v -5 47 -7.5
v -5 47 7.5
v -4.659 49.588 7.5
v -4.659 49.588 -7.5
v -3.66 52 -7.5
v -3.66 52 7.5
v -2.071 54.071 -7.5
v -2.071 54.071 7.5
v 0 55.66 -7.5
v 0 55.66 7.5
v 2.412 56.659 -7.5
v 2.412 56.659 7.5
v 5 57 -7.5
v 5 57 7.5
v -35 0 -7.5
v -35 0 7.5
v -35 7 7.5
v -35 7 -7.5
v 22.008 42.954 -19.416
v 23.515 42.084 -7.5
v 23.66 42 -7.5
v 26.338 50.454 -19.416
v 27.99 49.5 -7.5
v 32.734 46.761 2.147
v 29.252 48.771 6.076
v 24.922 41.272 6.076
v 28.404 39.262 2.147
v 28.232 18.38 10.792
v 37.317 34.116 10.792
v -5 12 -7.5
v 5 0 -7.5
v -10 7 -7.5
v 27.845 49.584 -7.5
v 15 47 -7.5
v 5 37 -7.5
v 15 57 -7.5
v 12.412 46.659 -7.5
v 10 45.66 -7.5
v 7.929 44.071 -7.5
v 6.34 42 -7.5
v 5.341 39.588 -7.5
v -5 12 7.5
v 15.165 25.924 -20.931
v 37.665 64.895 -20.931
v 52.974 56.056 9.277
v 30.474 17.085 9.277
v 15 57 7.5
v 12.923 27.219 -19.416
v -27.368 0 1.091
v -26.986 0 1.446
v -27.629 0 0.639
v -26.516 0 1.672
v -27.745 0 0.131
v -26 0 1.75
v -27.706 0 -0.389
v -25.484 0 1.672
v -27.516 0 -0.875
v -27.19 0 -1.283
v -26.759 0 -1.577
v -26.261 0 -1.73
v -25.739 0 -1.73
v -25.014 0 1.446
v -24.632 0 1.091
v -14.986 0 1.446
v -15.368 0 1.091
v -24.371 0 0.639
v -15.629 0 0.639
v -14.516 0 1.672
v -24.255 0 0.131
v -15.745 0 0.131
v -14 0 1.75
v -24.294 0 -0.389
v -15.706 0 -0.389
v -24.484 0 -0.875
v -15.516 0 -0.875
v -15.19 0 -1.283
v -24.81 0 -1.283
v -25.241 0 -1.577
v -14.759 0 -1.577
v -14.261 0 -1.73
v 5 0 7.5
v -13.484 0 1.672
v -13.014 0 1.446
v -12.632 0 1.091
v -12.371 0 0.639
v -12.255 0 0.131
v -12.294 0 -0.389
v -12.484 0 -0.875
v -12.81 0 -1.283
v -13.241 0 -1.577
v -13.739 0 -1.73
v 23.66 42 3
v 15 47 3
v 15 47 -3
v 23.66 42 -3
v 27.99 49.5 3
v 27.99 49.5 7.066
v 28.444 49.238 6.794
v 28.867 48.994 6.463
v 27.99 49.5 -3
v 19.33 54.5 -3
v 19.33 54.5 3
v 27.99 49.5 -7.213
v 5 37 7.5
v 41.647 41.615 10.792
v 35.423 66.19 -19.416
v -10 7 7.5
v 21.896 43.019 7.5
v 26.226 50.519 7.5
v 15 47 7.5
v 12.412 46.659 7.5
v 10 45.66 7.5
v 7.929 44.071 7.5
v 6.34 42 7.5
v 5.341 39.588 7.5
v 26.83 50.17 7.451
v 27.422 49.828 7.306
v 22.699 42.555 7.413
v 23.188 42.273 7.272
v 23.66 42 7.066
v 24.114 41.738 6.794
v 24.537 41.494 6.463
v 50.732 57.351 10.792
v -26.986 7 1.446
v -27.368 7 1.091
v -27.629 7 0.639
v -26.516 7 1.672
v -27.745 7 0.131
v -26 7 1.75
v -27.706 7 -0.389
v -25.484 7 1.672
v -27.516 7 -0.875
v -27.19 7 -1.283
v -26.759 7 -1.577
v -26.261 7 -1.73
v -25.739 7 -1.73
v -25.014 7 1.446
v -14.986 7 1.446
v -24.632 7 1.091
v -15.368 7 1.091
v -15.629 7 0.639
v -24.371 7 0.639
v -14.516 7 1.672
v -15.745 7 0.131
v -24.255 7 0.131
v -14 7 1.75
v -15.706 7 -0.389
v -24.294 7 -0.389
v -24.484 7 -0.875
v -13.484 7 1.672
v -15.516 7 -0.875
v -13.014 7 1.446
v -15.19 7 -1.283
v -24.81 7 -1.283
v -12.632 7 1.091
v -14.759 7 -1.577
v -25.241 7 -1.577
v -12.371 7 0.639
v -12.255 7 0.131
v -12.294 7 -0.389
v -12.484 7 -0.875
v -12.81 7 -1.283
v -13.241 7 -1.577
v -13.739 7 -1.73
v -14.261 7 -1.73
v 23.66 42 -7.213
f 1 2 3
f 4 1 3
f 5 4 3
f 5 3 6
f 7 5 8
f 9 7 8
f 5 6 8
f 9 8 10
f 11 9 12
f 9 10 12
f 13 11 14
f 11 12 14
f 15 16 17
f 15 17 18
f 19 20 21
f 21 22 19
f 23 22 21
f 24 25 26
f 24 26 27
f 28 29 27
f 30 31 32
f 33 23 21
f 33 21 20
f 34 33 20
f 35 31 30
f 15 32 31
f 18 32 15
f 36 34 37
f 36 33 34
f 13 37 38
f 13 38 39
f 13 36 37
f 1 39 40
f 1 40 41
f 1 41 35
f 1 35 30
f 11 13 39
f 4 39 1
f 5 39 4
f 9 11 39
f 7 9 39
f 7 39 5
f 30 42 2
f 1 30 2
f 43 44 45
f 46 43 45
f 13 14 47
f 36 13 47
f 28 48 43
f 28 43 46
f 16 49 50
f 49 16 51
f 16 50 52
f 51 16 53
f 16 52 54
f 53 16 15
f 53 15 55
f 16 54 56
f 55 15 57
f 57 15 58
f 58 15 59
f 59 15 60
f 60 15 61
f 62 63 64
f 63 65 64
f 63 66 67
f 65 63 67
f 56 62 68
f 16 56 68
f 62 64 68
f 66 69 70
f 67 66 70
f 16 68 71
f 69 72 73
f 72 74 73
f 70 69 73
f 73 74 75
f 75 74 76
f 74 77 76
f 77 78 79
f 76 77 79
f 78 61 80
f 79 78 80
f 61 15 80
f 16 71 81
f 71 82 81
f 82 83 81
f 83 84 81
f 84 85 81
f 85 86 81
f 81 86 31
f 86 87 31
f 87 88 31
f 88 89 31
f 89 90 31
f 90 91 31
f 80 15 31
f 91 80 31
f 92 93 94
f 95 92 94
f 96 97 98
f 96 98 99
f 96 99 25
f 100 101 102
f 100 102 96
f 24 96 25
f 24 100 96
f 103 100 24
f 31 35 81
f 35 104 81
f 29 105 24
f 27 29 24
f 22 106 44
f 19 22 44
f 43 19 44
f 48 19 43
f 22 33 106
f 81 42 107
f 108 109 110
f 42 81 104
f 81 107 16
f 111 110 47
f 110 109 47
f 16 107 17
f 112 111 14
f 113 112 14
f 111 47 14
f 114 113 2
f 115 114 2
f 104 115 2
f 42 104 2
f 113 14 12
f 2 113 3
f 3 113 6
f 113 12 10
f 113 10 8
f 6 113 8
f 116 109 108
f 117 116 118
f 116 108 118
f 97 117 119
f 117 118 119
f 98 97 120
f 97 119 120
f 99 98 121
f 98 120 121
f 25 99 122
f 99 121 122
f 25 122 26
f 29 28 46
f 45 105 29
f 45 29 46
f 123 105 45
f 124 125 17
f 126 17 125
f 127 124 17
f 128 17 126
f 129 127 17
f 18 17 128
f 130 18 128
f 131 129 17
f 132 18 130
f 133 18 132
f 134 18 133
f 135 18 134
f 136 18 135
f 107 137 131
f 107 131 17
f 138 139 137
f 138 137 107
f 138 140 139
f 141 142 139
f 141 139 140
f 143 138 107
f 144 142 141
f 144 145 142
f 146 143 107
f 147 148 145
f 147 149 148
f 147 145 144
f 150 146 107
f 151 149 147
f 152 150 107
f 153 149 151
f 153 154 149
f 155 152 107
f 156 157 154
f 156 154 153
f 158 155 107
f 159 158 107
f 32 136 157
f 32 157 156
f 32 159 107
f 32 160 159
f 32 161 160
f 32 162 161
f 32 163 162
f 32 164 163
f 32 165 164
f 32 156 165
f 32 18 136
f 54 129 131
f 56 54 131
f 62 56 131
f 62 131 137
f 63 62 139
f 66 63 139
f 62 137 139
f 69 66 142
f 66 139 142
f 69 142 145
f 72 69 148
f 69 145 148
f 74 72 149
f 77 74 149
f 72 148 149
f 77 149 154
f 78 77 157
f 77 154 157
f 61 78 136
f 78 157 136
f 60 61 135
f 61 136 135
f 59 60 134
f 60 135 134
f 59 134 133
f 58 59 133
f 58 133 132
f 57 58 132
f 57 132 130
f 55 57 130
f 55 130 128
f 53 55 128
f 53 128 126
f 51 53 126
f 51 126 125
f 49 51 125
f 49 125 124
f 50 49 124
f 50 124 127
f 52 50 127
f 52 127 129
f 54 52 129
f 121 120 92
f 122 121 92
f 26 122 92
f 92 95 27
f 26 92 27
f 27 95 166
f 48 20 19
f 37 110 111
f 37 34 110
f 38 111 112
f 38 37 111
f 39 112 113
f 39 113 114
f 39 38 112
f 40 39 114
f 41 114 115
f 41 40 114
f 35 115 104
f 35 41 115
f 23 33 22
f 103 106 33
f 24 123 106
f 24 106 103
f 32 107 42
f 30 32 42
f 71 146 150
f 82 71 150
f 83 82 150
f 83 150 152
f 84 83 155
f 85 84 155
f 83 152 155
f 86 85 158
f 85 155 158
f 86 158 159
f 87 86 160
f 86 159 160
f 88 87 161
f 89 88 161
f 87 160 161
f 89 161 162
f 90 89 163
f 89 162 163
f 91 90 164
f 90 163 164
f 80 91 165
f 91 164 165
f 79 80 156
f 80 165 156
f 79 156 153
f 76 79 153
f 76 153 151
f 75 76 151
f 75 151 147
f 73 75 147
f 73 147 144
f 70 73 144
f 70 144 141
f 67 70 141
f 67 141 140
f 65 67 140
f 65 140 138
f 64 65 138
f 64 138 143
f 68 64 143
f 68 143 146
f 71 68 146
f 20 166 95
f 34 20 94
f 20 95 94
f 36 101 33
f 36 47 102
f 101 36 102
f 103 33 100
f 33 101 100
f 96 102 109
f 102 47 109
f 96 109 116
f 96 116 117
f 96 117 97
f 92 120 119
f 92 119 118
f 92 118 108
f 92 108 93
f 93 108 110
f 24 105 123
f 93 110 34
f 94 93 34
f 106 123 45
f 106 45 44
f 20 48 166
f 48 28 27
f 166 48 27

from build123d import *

# Parameters (mm, degrees)
SKETCH_1_W               = 40
SKETCH_1_H               = 15
EXTRUDE_1_DEPTH          = 7
SKETCH_3_W               = 10
SKETCH_3_H               = 6
EXTRUDE_2_DEPTH          = 50
EXTRUDE_5_DEPTH          = 6
FILLET_1_R               = 10
SKETCH_7_R               = 1.75
CUT_EXTRUDE_3_DEPTH      = 10
SKETCH_16_W              = 6
SKETCH_16_H              = 8.660254038
EXTRUDE_11_DEPTH         = 10
EXTRUDE_12_DEPTH         = 8.66
EXTRUDE_14_DEPTH         = 3
EXTRUDE_15_DEPTH         = 4.5
EXTRUDE_15_DEPTH_BACK    = 10.5
EXTRUDE_17_DEPTH         = 8.66
EXTRUDE_22_DEPTH         = 8.66
EXTRUDE_23_DEPTH         = 15
FILLET_2_R               = 10
EXTRUDE_24_DEPTH         = 35
CUT_EXTRUDE_4_DEPTH      = 35
CUT_EXTRUDE_4_DEPTH_BACK = 35
CUT_EXTRUDE_5_DEPTH      = 35
CUT_EXTRUDE_5_DEPTH_BACK = 35
FILLET_3_R               = 5


with BuildPart() as part:
    # 草图1 → 凸台-拉伸1 (new body)
    with BuildSketch(Plane(origin=(0, 0, 0), x_dir=(1, 0, 0), z_dir=(0, 1, 0))):
        with Locations((-15, 0)):
            Rectangle(SKETCH_1_W, SKETCH_1_H)
    extrude(amount=EXTRUDE_1_DEPTH)

    # 草图3 → 凸台-拉伸2 (add)
    with BuildSketch(Plane(origin=(0, 7, 0), x_dir=(1, 0, 0), z_dir=(0, 1, 0))):
        Rectangle(SKETCH_3_W, SKETCH_3_H)
    extrude(amount=EXTRUDE_2_DEPTH)

    # 草图4 → 凸台-拉伸5 (add)
    with BuildSketch(Plane.XY.offset(3)):
        Polygon((5, 57), (5, 47), (15, 47), (19.330127019, 54.5), (15, 57), align=None)
    extrude(amount=-EXTRUDE_5_DEPTH)

    # 圆角1
    fillet_1_edges = [part.edges().sort_by_distance(p)[0] for p in [
        (-5, 57, 0),
    ]]
    fillet(fillet_1_edges, radius=FILLET_1_R)

    # 草图7 → 切除-拉伸3 (cut)
    with BuildSketch(Plane(origin=(0, 7, 0), x_dir=(1, 0, 0), z_dir=(0, 1, 0))):
        with Locations(Location((-26, 0, 0), (0, 0, 270))):
            Circle(SKETCH_7_R)
        with Locations(Location((-14, 0, 0), (0, 0, 270))):
            Circle(SKETCH_7_R)
    extrude(amount=-CUT_EXTRUDE_3_DEPTH, mode=Mode.SUBTRACT)

    # 草图16 → 凸台-拉伸11 (add)
    with BuildSketch(Plane(origin=(-9.101596989, 5.254809472, 0), x_dir=(0, 0, -1), z_dir=(0.8660254037844403, -0.4999999999999973, 0))):
        with Locations((0, 52.533320997)):
            Rectangle(SKETCH_16_W, SKETCH_16_H)
    extrude(amount=EXTRUDE_11_DEPTH)

    # 草图17 → 凸台-拉伸12 (add)
    with BuildSketch(Plane(origin=(28.431724008, 49.245190528, 0), x_dir=(0.8660254037844402, -0.4999999999999975, 0), z_dir=(0.4999999999999975, 0.8660254037844402, 0))):
        Polygon((-0.509618943, -3), (6.561448869, 4.071067812), (4.387416664, 7.7860808), (-0.509618943, 3), align=None)
    extrude(amount=-EXTRUDE_12_DEPTH)

    # 草图19 → 凸台-拉伸14 (add)
    with BuildSketch(Plane(origin=(5.769699285, -3.331137436, -3.898775098), x_dir=(-0.6556667796433489, -0.35687658637483116, -0.6653872377567577), z_dir=(0.7474459160042376, -0.43153810080973004, -0.5050737274875003))):
        Polygon((-33.928130068, 69.297295246), (-5.267738986, 34.604616147), (-32.250933841, 12.313200861), (-60.911324922, 47.00587996), align=None)
    extrude(amount=EXTRUDE_14_DEPTH)

    # 草图20 → 凸台-拉伸15 (add, two sides: drawn at the far end of the back side and taken through both)
    with BuildSketch(Plane(origin=(0, 0, -3), x_dir=(-1, 0, 0), z_dir=(0, 0, -1)).offset(-EXTRUDE_15_DEPTH_BACK)):
        with BuildLine():
            Line((-5, 7), (5, 7))
            Line((5, 7), (5, 47))
            ThreePointArc((5, 47), (2.071067812, 54.071067812), (-5, 57))
            Line((-5, 57), (-15, 57))
            Line((-15, 57), (-27.990381057, 49.5))
            Line((-27.990381057, 49.5), (-23.660381057, 42.000220003))
            Line((-23.660381057, 42.000220003), (-15, 47))
            Line((-15, 47), (-5, 47))
            Line((-5, 47), (-5, 7))
        make_face()
    extrude(amount=EXTRUDE_15_DEPTH + EXTRUDE_15_DEPTH_BACK)

    # 草图21 → 凸台-拉伸17 (add)
    with BuildSketch(Plane(origin=(28.431724008, 49.245190528, 0), x_dir=(0.8660254037844402, -0.4999999999999975, 0), z_dir=(0.4999999999999975, 0.8660254037844402, 0))):
        Polygon((-0.509618943, 7.5), (-0.509618943, 3), (4.387416664, 7.7860808), align=None)
        Polygon((-0.509618943, -7.5), (8.29635004, 1.106447339), (6.561448869, 4.071067812), (-0.509618943, -3), align=None)
    extrude(amount=-EXTRUDE_17_DEPTH)

    # 草图22 → 凸台-拉伸22 (add)
    with BuildSketch(Plane(origin=(28.431724008, 49.245190528, 0), x_dir=(0.8660254037844402, -0.4999999999999975, 0), z_dir=(0.4999999999999975, 0.8660254037844402, 0))):
        Polygon((4.387416664, 7.7860808), (-2.41816344, 19.41553984), (-0.509618943, 7.5), align=None)
        Polygon((8.29635004, 1.106447339), (15.259417022, -10.792127217), (4.967687183, -2.146796188), align=None)
    extrude(amount=-EXTRUDE_22_DEPTH)

    # 草图23 → 凸台-拉伸23 (add)
    with BuildSketch(Plane.XY.offset(7.5)):
        Polygon((-5, 7), (-10, 7), (-5, 12), align=None)
    extrude(amount=-EXTRUDE_23_DEPTH)

    # 圆角2
    fillet_2_edges = [part.edges().sort_by_distance(p)[0] for p in [
        (5, 47, 0),
    ]]
    fillet(fillet_2_edges, radius=FILLET_2_R - 0.0001)  # a hair under: the kernel refuses the full size


with BuildPart() as extrude_24_tool:
    # 草图24 → 凸台-拉伸24 (new body)
    with BuildSketch(Plane(origin=(7.445343505, -4.298571076, 14.690902319), x_dir=(0.8992638085264243, 0.12283526789294275, -0.4198048351748937), z_dir=(0.43740667881795164, -0.25253686369234724, 0.8630762016194644))):
        Polygon((34.27908934, 45.482482988), (38.032691816, 42.971530425), (48.135364869, 58.073933853), align=None)
        Polygon((29.464039564, 38.284504407), (33.21764204, 35.773551844), (23.114898365, 20.671042842), align=None)
    extrude(amount=-EXTRUDE_24_DEPTH)


with BuildPart() as part_1:
    add(part.part)


with BuildPart() as part_2:
    # 凸台-拉伸24: joined with extrude_24_tool
    add(part_1.part.fuse(extrude_24_tool.part, tol=0.00001))

    # 草图25 → 切除-拉伸4 (cut, two sides: drawn at the far end of the back side and taken through both)
    with BuildSketch(Plane(origin=(28.431724014, 49.245190525, -8e-09), x_dir=(0.866025403727626, -0.5000000000984025, 7.809544934800217e-11), z_dir=(-0.5000000000984025, -0.866025403727626, 1.35265286075167e-10)).offset(-CUT_EXTRUDE_4_DEPTH_BACK)):
        Polygon((11.361749763, 13.073049031), (15.259417021, 10.792127222), (4.967687177, 2.146796194), align=None)
    extrude(amount=CUT_EXTRUDE_4_DEPTH + CUT_EXTRUDE_4_DEPTH_BACK, mode=Mode.SUBTRACT)

    # 草图26 → 切除-拉伸5 (cut, two sides: drawn at the far end of the back side and taken through both)
    with BuildSketch(Plane(origin=(24.101724013, 41.745410529, -7e-09), x_dir=(0.8660254037276265, -0.5000000000984015, 7.809507734629167e-11), z_dir=(0.5000000000984015, 0.8660254037276265, -1.3526464174930455e-10)).offset(-CUT_EXTRUDE_5_DEPTH_BACK)):
        Polygon((-0.677635102, 7.499999992), (-2.41816345, 19.415539829), (-6.315830703, 17.134618023), align=None)
    extrude(amount=CUT_EXTRUDE_5_DEPTH + CUT_EXTRUDE_5_DEPTH_BACK, mode=Mode.SUBTRACT)

    # 圆角3
    fillet_3_edges = [part_2.edges().sort_by_distance(p)[0] for p in [
        (25.825381057, 45.750110002, 7.5),
    ]]
    fillet(fillet_3_edges, radius=FILLET_3_R)


solid = part_2.part
